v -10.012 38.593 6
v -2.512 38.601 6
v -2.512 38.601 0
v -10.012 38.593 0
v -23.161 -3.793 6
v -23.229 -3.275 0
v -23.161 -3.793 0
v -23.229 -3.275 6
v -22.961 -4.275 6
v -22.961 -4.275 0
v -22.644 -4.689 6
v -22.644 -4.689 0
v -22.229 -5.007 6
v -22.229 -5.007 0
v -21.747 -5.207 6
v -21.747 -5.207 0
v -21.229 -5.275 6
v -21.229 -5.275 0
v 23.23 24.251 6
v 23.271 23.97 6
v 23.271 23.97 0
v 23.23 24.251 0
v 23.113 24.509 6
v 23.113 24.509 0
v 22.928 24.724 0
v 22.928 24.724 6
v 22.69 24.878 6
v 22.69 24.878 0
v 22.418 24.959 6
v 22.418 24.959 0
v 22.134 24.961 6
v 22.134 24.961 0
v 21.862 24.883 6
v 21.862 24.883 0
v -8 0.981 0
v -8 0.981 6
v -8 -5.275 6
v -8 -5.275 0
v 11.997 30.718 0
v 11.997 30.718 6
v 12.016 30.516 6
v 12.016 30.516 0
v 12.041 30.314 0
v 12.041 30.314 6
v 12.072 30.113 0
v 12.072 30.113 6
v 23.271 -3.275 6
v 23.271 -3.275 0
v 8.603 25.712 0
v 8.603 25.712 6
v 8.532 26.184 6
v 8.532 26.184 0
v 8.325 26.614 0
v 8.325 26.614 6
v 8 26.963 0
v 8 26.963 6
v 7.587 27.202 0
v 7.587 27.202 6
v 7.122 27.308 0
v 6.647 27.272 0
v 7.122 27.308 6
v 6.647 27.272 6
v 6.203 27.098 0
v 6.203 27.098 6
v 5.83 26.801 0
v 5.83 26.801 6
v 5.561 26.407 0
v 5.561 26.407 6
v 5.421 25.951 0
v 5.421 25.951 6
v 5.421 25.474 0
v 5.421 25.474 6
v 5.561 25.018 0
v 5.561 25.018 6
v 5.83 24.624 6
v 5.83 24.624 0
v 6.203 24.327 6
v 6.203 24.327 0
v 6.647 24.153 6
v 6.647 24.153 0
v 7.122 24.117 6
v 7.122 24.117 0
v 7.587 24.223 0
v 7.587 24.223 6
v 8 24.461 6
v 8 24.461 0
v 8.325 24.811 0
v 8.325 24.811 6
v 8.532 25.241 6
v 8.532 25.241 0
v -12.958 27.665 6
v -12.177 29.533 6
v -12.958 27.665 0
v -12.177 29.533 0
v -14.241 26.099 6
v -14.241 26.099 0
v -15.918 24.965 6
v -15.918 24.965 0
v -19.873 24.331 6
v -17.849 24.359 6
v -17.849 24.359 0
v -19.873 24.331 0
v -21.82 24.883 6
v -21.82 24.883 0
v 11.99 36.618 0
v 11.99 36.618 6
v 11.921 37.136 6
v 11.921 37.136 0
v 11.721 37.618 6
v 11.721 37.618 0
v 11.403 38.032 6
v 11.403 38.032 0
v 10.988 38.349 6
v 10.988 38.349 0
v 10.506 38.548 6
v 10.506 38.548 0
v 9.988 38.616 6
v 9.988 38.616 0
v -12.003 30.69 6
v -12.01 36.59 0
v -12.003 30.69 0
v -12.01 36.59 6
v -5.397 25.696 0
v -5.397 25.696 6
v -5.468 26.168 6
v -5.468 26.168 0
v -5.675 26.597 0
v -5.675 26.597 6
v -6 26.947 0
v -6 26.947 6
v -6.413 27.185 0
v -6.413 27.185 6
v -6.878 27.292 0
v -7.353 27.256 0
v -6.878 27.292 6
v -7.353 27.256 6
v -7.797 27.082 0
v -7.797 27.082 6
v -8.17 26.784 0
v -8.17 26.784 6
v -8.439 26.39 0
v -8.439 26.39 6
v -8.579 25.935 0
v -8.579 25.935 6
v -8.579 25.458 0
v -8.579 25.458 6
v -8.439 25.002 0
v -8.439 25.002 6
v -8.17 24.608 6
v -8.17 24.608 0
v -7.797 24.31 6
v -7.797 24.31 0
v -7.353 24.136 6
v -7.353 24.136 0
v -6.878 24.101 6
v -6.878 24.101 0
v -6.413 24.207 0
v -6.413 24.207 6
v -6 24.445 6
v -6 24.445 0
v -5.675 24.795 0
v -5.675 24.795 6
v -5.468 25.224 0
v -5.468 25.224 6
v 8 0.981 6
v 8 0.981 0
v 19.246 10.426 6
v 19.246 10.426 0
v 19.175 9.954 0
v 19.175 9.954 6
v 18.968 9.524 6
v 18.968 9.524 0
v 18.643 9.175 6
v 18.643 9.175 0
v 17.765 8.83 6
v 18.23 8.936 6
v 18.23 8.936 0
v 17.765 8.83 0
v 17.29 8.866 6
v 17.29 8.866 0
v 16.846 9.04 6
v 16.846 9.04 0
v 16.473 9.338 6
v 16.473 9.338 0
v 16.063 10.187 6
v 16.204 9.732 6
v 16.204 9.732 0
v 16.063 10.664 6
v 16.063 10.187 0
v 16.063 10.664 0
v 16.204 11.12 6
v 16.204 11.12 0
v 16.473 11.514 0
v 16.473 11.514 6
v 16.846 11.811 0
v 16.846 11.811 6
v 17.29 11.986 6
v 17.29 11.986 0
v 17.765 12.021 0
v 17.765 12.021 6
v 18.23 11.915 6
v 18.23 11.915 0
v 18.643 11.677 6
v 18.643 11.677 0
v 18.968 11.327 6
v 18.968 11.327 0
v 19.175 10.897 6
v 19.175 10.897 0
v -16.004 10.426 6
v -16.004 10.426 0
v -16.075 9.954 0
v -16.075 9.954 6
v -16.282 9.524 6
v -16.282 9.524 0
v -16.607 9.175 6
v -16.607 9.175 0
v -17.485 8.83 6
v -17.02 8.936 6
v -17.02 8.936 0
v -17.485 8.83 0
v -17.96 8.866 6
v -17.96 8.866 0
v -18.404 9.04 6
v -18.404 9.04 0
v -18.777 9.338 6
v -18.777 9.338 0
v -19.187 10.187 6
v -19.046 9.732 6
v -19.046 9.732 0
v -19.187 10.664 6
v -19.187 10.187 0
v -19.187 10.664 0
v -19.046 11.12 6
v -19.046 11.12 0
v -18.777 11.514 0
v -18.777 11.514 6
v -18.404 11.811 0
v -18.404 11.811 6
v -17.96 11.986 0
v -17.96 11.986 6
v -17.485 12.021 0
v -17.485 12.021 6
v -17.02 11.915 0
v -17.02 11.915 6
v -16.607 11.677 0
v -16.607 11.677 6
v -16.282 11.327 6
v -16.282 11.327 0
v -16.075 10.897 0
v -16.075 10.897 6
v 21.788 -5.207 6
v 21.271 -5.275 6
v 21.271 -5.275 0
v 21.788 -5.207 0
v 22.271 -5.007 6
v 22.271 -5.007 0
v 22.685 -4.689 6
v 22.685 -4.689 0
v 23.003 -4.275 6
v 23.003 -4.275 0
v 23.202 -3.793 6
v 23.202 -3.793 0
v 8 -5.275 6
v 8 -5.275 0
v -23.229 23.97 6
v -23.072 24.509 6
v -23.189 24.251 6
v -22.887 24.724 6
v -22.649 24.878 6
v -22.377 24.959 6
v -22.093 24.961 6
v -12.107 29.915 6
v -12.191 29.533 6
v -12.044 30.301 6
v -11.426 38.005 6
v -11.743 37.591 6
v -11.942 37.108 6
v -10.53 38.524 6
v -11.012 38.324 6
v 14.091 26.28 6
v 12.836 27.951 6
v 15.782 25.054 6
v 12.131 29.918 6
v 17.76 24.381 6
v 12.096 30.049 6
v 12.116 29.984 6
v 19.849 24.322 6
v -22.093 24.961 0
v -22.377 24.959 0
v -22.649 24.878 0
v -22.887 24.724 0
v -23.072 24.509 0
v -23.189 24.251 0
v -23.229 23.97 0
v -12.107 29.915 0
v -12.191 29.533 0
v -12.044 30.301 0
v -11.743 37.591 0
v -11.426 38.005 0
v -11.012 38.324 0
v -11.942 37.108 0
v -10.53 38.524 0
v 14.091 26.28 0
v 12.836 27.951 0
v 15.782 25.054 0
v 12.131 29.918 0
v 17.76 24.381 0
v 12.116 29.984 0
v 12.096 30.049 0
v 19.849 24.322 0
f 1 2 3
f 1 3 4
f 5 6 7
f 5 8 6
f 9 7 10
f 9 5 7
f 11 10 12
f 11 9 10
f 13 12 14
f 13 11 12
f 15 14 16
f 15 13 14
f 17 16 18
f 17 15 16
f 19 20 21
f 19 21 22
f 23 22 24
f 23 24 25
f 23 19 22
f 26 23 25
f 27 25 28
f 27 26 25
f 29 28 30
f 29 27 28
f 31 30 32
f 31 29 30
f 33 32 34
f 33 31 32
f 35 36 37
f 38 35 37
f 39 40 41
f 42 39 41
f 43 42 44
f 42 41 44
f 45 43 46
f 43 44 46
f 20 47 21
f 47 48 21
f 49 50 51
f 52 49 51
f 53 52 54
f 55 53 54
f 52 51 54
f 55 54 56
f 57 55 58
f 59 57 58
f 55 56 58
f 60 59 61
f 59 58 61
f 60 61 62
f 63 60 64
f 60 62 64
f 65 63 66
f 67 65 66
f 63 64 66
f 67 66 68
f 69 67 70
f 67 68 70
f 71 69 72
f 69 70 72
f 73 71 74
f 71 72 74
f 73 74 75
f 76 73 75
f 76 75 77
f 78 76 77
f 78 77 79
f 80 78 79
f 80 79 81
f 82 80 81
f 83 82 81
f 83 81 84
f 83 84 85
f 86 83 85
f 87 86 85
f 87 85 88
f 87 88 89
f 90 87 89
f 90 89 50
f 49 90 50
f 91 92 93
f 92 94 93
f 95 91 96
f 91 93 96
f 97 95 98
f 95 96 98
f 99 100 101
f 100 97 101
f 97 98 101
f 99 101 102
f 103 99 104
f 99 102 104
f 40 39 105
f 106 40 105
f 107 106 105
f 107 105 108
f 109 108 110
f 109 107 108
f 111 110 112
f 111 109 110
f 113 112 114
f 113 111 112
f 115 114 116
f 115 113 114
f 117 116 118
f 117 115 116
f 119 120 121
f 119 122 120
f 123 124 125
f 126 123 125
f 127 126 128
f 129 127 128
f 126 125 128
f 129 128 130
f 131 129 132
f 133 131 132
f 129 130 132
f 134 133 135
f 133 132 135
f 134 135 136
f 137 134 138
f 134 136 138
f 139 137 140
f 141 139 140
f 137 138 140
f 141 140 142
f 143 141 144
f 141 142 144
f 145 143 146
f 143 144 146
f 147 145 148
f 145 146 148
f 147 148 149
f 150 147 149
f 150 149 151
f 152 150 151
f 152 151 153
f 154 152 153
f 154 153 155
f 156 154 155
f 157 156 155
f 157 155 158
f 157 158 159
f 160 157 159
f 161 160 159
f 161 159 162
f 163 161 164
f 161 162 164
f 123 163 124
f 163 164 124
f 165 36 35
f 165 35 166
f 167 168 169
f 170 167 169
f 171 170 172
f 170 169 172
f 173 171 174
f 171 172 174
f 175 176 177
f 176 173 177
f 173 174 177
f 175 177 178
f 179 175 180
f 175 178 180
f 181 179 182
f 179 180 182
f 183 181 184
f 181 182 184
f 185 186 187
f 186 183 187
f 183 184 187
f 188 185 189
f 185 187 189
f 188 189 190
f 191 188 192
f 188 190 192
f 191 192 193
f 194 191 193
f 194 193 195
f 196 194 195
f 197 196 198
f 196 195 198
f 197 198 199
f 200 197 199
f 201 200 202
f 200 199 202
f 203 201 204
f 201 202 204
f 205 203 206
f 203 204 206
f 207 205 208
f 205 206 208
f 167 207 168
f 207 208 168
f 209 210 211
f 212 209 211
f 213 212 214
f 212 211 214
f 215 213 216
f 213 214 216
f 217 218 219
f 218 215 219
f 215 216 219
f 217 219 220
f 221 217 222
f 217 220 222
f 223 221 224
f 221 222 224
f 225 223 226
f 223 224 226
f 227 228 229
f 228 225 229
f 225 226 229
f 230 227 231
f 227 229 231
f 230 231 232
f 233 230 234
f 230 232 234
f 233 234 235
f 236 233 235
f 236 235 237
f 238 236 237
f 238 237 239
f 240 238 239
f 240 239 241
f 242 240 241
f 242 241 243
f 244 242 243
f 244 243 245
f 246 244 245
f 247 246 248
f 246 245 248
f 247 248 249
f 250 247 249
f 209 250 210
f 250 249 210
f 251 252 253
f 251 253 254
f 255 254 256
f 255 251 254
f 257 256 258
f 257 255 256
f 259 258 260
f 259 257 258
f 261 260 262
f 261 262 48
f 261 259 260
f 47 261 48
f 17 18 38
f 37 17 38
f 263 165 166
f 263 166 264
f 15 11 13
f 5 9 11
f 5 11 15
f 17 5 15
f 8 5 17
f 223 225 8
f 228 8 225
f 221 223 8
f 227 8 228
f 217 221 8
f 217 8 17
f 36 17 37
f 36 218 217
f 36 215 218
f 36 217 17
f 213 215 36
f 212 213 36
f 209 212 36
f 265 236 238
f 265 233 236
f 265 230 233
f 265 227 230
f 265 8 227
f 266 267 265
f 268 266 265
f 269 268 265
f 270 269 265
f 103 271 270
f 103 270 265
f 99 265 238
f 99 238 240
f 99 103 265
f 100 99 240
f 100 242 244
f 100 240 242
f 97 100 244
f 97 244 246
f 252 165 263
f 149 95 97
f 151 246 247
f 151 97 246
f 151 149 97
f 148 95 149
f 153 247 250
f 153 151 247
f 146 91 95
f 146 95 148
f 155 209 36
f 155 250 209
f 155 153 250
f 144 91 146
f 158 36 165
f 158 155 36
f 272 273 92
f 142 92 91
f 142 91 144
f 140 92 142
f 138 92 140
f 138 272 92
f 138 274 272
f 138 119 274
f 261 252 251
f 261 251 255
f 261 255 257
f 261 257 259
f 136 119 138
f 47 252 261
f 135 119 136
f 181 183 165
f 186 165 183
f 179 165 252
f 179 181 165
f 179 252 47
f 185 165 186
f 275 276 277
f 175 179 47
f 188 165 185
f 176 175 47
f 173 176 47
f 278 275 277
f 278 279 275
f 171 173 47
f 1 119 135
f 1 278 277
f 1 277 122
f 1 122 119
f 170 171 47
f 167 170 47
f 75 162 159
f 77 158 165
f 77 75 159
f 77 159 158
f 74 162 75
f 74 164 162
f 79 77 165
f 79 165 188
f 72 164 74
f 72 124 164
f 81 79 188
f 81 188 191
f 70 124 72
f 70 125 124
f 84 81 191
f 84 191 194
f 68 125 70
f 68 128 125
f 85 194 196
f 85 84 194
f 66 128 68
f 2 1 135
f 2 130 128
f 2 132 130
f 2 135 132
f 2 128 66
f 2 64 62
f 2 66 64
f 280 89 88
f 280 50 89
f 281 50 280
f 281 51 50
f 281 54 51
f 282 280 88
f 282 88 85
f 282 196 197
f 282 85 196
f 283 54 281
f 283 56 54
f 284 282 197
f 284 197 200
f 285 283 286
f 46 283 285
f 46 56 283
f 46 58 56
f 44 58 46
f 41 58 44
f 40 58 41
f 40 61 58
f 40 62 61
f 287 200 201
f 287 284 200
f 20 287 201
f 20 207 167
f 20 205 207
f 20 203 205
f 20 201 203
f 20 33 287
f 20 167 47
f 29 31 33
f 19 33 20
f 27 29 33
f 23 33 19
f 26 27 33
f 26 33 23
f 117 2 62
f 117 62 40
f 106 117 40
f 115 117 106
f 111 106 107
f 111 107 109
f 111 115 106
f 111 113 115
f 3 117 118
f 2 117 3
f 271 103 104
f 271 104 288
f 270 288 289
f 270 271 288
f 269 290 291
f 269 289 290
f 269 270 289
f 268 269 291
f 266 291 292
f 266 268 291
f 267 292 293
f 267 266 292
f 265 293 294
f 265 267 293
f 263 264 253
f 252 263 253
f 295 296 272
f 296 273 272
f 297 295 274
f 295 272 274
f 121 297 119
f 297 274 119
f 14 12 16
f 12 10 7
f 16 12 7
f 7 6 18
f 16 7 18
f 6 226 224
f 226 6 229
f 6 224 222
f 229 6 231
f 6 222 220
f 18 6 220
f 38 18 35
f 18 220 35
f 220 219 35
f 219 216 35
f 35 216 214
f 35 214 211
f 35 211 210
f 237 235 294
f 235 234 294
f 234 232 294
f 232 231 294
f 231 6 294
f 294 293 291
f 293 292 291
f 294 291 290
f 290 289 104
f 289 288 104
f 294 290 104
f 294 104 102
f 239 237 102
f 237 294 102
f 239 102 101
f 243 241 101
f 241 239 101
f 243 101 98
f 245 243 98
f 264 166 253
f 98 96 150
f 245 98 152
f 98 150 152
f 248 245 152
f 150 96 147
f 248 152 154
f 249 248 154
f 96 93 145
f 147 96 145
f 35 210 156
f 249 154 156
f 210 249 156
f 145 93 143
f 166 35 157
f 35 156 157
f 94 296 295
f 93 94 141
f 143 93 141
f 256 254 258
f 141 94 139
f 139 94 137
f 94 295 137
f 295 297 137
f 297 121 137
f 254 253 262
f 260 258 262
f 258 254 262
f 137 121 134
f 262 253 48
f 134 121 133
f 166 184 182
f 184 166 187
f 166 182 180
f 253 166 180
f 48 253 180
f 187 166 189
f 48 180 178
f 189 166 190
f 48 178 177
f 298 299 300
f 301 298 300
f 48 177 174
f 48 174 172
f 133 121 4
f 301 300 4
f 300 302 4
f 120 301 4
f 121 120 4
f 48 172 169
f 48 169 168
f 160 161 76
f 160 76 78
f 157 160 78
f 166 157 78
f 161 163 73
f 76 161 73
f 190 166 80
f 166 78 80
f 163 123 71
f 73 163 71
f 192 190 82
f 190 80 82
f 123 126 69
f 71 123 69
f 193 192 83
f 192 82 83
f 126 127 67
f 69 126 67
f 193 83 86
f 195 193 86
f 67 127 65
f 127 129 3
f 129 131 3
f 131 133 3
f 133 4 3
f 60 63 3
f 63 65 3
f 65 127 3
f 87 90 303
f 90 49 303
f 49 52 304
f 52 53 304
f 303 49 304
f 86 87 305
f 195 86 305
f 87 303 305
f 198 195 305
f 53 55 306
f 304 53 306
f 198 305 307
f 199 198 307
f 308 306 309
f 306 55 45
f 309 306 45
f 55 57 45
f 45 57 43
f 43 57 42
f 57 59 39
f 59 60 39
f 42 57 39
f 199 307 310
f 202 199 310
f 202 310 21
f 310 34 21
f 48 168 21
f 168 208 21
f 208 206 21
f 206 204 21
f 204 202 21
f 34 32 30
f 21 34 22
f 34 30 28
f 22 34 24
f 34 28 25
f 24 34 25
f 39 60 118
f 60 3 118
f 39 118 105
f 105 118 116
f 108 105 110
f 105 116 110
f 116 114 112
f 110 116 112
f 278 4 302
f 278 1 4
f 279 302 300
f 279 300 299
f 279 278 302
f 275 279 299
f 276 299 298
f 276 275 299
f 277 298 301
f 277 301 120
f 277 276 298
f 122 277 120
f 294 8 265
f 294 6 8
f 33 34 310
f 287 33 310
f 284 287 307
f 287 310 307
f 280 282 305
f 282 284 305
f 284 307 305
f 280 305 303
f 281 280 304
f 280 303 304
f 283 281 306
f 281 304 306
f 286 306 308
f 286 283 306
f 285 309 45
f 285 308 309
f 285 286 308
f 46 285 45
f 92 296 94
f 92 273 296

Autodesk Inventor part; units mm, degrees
ref_plane "YZ Plane" through (0, 0, 0) normal (1, 0, 0) x (0, 1, 0)
ref_plane "XZ Plane" through (0, 0, 0) normal (0, 1, 0) x (-1, 0, 0)
sketch "Sketch1" plane through (0, 0, 0) normal (0, 0, 1) x (1, 0, 0)
  line L0 (-23.2294, -5.2752) -> (-23.2294, 25.7248)
  arc A0 (-23.2294, 25.7248) -> (-11.9794, 30.7248) centre (-18.9581, 31.2706) ccw
  line L1 (0.0206, 30.7248) -> (-11.9794, 30.7248)
  line L2 (0.0206, 30.7248) -> (12.0206, 30.7248)
  arc A1 (12.0206, 30.7248) -> (23.2706, 25.7248) centre (18.9993, 31.2706) ccw
  line L3 (23.2706, -5.2752) -> (23.2706, 25.7248)
  circle A2 centre (17.6456, 10.4258) radius 1.6
  circle A3 centre (-17.6044, 10.4258) radius 1.6
  line L4 (-23.2294, -5.2752) -> (23.2706, -5.2752)
  point P0 (0, 0)
  point P1 (0, -3.0755)
extrude "Extrusion1" add sketch "Sketch1" along normal blind 6
sketch "Sketch2" plane through (0, 0, 6) normal (0, 0, 1) x (1, 0, 0)
  circle A0 centre (-6.9972, 25.6961) radius 1.6 projected
  circle A1 centre (7.0028, 25.7124) radius 1.6 projected
  point P0 (0, 0)
extrude "Extrusion2" cut sketch "Sketch2" against normal through all
fillet "Fillet1" radius 1 4 edges at (-11.9794, 30.7248, 3) (-23.2294, 25.7248, 3) (12.0206, 30.7248, 3) (23.2706, 25.7248, 3)
fillet "Fillet2" radius 2 2 edges at (-23.2294, -5.2752, 3) (23.2706, -5.2752, 3)
sketch "Sketch3" plane through (0, 0, 6) normal (0, 0, 1) x (1, 0, 0)
  line L0 (0, 0.9807) -> (-8, 0.9807)
  line L1 (0, 0.9807) -> (8, 0.9807) construction
  line L2 (-8, 0.9807) -> (8, 0.9807)
  line L3 (8, 0.9807) -> (8, -5.2752)
  line L4 (21.2706, -5.2752) -> (-21.2294, -5.2752) projected
  line L5 (-8, 0.9807) -> (-8, -5.2752)
  point P0 (0, 0)
  dimension "d6" = 8
  dimension "d7" = 180
  dimension "d8" = 16
  dimension "d9" = 0
extrude "Extrusion3" cut sketch "Sketch3" against normal blind 10
sketch "Sketch4" plane through (0, 0, 6) normal (0, 0, 1) x (1, 0, 0)
  arc A0 (6.0143, -33.637) -> (7.9856, -35.2865) centre (7.9833, -33.2865) ccw projected
  line L0 (7.9856, -35.2865) -> (21.3237, -35.271) projected
  arc A1 (21.3237, -35.271) -> (23.3214, -33.2687) centre (21.3214, -33.271) ccw projected
  line L1 (23.3214, -33.2687) -> (23.2549, 23.9765) projected
  arc A2 (23.2549, 23.9765) -> (21.8449, 24.8874) centre (22.2549, 23.9753) ccw projected
  arc A3 (11.997, 30.7182) -> (21.8449, 24.8874) centre (18.9751, 31.2721) ccw projected
  line L2 (11.997, 30.7182) -> (11.9902, 36.6182) projected
  arc A4 (11.9902, 36.6182) -> (9.9879, 38.6159) centre (9.9902, 36.6159) ccw projected
  line L3 (9.9879, 38.6159) -> (2.4879, 38.6072) projected
  arc A5 (2.4879, 38.6072) -> (1.489, 37.606) centre (2.489, 37.6072) ccw projected
  line L4 (1.489, 37.606) -> (1.4937, 33.606) projected
  line L5 (1.4937, 33.606) -> (2.7437, 33.6075) projected
  line L6 (2.7437, 33.6075) -> (2.747, 30.7075) projected
  line L7 (2.747, 30.7075) -> (1.547, 30.7061) projected
  line L8 (1.547, 30.7061) -> (1.5587, 20.7061) projected
  line L9 (1.5587, 20.7061) -> (10.0087, 20.7159) projected
  arc A6 (12.011, 18.7182) -> (10.0087, 20.7159) centre (10.011, 18.7159) ccw projected
  line L10 (12.011, 18.7182) -> (12.0365, -3.2818) projected
  arc A7 (12.0365, -3.2818) -> (14.0389, -5.2794) centre (14.0365, -3.2794) ccw projected
  line L11 (14.0389, -5.2794) -> (16.2889, -5.2768) projected
  arc A8 (18.2912, -7.2745) -> (16.2889, -5.2768) centre (16.2912, -7.2768) ccw projected
  line L12 (18.2912, -7.2745) -> (18.3109, -24.2745) projected
  arc A9 (16.3133, -26.2768) -> (18.3109, -24.2745) centre (16.3109, -24.2768) ccw projected
  line L13 (16.3133, -26.2768) -> (-16.1867, -26.3146) projected
  arc A10 (-18.189, -24.3169) -> (-16.1867, -26.3146) centre (-16.189, -24.3146) ccw projected
  line L14 (-18.189, -24.3169) -> (-18.2088, -7.3169) projected
  arc A11 (-16.2111, -5.3146) -> (-18.2088, -7.3169) centre (-16.2088, -7.3146) ccw projected
  line L15 (-16.2111, -5.3146) -> (-13.9611, -5.312) projected
  arc A12 (-13.9611, -5.312) -> (-11.9634, -3.3096) centre (-13.9634, -3.312) ccw projected
  line L16 (-11.9634, -3.3096) -> (-11.989, 18.6903) projected
  arc A13 (-9.9913, 20.6927) -> (-11.989, 18.6903) centre (-9.989, 18.6927) ccw projected
  line L17 (-9.9913, 20.6927) -> (-1.5413, 20.7025) projected
  line L18 (-1.5413, 20.7025) -> (-1.553, 30.7025) projected
  line L19 (-1.553, 30.7025) -> (-2.753, 30.7011) projected
  line L20 (-2.753, 30.7011) -> (-2.7563, 33.6011) projected
  line L21 (-2.7563, 33.6011) -> (-1.5063, 33.6025) projected
  line L22 (-1.5063, 33.6025) -> (-1.511, 37.6025) projected
  arc A14 (-1.511, 37.6025) -> (-2.5121, 38.6014) centre (-2.511, 37.6014) ccw projected
  line L23 (-2.5121, 38.6014) -> (-10.0121, 38.5926) projected
  arc A15 (-10.0121, 38.5926) -> (-12.0098, 36.5903) centre (-10.0098, 36.5926) ccw projected
  line L24 (-12.0098, 36.5903) -> (-12.0029, 30.6903) projected
  arc A16 (-21.8372, 24.8367) -> (-12.0029, 30.6903) centre (-18.9823, 31.228) ccw projected
  arc A17 (-21.8372, 24.8367) -> (-23.2451, 23.9225) centre (-22.2451, 23.9236) ccw projected
  line L25 (-23.2451, 23.9225) -> (-23.1786, -33.3227) projected
  arc A18 (-23.1786, -33.3227) -> (-21.1762, -35.3204) centre (-21.1786, -33.3204) ccw projected
  line L26 (-21.1762, -35.3204) -> (-7.8381, -35.3049) projected
  arc A19 (-7.8381, -35.3049) -> (-5.8706, -33.6509) centre (-7.8405, -33.3049) ccw projected
  arc A20 (6.0143, -33.637) -> (-5.8706, -33.6509) centre (0.073, -34.6948) ccw projected
  circle A21 centre (17.6456, 10.4258) radius 1.6 projected
  circle A22 centre (-17.6044, 10.3848) radius 1.6 projected
  circle A23 centre (7.0029, 25.7124) radius 1.6 projected
  circle A24 centre (-6.9971, 25.6961) radius 1.6 projected
  line L27 (11.1501, 30.7248) -> (-11.1088, 30.7248) projected
  line L28 (-2.5121, 38.6014) -> (2.4879, 38.6072)
  line L29 (-12.1907, 29.5326) -> (12.1947, 29.5326)
  point P0 (0, 0)
ref_plane "Work Plane1" through (-23.2654, -35.3247, 0) normal (0, 0, 1) x (1, 0.0012, 0)
extrude "Extrusion4" add sketch "Sketch4" against normal up to surface (6 mm away) contours L29 L8 L7 L6 L5 L4 A5 L3 A4 L2 A3 | L29 L18 L19 L20 L27 L6 L7 L8 | A16 L24 A15 L23 A14 L22 L21 L20 L19 L18 L29 | A5 L4 L5 L6 L27 L20 L21 L22 A14 L28
properties part number "Hotend Slide Part3" material "PET Plastic"
